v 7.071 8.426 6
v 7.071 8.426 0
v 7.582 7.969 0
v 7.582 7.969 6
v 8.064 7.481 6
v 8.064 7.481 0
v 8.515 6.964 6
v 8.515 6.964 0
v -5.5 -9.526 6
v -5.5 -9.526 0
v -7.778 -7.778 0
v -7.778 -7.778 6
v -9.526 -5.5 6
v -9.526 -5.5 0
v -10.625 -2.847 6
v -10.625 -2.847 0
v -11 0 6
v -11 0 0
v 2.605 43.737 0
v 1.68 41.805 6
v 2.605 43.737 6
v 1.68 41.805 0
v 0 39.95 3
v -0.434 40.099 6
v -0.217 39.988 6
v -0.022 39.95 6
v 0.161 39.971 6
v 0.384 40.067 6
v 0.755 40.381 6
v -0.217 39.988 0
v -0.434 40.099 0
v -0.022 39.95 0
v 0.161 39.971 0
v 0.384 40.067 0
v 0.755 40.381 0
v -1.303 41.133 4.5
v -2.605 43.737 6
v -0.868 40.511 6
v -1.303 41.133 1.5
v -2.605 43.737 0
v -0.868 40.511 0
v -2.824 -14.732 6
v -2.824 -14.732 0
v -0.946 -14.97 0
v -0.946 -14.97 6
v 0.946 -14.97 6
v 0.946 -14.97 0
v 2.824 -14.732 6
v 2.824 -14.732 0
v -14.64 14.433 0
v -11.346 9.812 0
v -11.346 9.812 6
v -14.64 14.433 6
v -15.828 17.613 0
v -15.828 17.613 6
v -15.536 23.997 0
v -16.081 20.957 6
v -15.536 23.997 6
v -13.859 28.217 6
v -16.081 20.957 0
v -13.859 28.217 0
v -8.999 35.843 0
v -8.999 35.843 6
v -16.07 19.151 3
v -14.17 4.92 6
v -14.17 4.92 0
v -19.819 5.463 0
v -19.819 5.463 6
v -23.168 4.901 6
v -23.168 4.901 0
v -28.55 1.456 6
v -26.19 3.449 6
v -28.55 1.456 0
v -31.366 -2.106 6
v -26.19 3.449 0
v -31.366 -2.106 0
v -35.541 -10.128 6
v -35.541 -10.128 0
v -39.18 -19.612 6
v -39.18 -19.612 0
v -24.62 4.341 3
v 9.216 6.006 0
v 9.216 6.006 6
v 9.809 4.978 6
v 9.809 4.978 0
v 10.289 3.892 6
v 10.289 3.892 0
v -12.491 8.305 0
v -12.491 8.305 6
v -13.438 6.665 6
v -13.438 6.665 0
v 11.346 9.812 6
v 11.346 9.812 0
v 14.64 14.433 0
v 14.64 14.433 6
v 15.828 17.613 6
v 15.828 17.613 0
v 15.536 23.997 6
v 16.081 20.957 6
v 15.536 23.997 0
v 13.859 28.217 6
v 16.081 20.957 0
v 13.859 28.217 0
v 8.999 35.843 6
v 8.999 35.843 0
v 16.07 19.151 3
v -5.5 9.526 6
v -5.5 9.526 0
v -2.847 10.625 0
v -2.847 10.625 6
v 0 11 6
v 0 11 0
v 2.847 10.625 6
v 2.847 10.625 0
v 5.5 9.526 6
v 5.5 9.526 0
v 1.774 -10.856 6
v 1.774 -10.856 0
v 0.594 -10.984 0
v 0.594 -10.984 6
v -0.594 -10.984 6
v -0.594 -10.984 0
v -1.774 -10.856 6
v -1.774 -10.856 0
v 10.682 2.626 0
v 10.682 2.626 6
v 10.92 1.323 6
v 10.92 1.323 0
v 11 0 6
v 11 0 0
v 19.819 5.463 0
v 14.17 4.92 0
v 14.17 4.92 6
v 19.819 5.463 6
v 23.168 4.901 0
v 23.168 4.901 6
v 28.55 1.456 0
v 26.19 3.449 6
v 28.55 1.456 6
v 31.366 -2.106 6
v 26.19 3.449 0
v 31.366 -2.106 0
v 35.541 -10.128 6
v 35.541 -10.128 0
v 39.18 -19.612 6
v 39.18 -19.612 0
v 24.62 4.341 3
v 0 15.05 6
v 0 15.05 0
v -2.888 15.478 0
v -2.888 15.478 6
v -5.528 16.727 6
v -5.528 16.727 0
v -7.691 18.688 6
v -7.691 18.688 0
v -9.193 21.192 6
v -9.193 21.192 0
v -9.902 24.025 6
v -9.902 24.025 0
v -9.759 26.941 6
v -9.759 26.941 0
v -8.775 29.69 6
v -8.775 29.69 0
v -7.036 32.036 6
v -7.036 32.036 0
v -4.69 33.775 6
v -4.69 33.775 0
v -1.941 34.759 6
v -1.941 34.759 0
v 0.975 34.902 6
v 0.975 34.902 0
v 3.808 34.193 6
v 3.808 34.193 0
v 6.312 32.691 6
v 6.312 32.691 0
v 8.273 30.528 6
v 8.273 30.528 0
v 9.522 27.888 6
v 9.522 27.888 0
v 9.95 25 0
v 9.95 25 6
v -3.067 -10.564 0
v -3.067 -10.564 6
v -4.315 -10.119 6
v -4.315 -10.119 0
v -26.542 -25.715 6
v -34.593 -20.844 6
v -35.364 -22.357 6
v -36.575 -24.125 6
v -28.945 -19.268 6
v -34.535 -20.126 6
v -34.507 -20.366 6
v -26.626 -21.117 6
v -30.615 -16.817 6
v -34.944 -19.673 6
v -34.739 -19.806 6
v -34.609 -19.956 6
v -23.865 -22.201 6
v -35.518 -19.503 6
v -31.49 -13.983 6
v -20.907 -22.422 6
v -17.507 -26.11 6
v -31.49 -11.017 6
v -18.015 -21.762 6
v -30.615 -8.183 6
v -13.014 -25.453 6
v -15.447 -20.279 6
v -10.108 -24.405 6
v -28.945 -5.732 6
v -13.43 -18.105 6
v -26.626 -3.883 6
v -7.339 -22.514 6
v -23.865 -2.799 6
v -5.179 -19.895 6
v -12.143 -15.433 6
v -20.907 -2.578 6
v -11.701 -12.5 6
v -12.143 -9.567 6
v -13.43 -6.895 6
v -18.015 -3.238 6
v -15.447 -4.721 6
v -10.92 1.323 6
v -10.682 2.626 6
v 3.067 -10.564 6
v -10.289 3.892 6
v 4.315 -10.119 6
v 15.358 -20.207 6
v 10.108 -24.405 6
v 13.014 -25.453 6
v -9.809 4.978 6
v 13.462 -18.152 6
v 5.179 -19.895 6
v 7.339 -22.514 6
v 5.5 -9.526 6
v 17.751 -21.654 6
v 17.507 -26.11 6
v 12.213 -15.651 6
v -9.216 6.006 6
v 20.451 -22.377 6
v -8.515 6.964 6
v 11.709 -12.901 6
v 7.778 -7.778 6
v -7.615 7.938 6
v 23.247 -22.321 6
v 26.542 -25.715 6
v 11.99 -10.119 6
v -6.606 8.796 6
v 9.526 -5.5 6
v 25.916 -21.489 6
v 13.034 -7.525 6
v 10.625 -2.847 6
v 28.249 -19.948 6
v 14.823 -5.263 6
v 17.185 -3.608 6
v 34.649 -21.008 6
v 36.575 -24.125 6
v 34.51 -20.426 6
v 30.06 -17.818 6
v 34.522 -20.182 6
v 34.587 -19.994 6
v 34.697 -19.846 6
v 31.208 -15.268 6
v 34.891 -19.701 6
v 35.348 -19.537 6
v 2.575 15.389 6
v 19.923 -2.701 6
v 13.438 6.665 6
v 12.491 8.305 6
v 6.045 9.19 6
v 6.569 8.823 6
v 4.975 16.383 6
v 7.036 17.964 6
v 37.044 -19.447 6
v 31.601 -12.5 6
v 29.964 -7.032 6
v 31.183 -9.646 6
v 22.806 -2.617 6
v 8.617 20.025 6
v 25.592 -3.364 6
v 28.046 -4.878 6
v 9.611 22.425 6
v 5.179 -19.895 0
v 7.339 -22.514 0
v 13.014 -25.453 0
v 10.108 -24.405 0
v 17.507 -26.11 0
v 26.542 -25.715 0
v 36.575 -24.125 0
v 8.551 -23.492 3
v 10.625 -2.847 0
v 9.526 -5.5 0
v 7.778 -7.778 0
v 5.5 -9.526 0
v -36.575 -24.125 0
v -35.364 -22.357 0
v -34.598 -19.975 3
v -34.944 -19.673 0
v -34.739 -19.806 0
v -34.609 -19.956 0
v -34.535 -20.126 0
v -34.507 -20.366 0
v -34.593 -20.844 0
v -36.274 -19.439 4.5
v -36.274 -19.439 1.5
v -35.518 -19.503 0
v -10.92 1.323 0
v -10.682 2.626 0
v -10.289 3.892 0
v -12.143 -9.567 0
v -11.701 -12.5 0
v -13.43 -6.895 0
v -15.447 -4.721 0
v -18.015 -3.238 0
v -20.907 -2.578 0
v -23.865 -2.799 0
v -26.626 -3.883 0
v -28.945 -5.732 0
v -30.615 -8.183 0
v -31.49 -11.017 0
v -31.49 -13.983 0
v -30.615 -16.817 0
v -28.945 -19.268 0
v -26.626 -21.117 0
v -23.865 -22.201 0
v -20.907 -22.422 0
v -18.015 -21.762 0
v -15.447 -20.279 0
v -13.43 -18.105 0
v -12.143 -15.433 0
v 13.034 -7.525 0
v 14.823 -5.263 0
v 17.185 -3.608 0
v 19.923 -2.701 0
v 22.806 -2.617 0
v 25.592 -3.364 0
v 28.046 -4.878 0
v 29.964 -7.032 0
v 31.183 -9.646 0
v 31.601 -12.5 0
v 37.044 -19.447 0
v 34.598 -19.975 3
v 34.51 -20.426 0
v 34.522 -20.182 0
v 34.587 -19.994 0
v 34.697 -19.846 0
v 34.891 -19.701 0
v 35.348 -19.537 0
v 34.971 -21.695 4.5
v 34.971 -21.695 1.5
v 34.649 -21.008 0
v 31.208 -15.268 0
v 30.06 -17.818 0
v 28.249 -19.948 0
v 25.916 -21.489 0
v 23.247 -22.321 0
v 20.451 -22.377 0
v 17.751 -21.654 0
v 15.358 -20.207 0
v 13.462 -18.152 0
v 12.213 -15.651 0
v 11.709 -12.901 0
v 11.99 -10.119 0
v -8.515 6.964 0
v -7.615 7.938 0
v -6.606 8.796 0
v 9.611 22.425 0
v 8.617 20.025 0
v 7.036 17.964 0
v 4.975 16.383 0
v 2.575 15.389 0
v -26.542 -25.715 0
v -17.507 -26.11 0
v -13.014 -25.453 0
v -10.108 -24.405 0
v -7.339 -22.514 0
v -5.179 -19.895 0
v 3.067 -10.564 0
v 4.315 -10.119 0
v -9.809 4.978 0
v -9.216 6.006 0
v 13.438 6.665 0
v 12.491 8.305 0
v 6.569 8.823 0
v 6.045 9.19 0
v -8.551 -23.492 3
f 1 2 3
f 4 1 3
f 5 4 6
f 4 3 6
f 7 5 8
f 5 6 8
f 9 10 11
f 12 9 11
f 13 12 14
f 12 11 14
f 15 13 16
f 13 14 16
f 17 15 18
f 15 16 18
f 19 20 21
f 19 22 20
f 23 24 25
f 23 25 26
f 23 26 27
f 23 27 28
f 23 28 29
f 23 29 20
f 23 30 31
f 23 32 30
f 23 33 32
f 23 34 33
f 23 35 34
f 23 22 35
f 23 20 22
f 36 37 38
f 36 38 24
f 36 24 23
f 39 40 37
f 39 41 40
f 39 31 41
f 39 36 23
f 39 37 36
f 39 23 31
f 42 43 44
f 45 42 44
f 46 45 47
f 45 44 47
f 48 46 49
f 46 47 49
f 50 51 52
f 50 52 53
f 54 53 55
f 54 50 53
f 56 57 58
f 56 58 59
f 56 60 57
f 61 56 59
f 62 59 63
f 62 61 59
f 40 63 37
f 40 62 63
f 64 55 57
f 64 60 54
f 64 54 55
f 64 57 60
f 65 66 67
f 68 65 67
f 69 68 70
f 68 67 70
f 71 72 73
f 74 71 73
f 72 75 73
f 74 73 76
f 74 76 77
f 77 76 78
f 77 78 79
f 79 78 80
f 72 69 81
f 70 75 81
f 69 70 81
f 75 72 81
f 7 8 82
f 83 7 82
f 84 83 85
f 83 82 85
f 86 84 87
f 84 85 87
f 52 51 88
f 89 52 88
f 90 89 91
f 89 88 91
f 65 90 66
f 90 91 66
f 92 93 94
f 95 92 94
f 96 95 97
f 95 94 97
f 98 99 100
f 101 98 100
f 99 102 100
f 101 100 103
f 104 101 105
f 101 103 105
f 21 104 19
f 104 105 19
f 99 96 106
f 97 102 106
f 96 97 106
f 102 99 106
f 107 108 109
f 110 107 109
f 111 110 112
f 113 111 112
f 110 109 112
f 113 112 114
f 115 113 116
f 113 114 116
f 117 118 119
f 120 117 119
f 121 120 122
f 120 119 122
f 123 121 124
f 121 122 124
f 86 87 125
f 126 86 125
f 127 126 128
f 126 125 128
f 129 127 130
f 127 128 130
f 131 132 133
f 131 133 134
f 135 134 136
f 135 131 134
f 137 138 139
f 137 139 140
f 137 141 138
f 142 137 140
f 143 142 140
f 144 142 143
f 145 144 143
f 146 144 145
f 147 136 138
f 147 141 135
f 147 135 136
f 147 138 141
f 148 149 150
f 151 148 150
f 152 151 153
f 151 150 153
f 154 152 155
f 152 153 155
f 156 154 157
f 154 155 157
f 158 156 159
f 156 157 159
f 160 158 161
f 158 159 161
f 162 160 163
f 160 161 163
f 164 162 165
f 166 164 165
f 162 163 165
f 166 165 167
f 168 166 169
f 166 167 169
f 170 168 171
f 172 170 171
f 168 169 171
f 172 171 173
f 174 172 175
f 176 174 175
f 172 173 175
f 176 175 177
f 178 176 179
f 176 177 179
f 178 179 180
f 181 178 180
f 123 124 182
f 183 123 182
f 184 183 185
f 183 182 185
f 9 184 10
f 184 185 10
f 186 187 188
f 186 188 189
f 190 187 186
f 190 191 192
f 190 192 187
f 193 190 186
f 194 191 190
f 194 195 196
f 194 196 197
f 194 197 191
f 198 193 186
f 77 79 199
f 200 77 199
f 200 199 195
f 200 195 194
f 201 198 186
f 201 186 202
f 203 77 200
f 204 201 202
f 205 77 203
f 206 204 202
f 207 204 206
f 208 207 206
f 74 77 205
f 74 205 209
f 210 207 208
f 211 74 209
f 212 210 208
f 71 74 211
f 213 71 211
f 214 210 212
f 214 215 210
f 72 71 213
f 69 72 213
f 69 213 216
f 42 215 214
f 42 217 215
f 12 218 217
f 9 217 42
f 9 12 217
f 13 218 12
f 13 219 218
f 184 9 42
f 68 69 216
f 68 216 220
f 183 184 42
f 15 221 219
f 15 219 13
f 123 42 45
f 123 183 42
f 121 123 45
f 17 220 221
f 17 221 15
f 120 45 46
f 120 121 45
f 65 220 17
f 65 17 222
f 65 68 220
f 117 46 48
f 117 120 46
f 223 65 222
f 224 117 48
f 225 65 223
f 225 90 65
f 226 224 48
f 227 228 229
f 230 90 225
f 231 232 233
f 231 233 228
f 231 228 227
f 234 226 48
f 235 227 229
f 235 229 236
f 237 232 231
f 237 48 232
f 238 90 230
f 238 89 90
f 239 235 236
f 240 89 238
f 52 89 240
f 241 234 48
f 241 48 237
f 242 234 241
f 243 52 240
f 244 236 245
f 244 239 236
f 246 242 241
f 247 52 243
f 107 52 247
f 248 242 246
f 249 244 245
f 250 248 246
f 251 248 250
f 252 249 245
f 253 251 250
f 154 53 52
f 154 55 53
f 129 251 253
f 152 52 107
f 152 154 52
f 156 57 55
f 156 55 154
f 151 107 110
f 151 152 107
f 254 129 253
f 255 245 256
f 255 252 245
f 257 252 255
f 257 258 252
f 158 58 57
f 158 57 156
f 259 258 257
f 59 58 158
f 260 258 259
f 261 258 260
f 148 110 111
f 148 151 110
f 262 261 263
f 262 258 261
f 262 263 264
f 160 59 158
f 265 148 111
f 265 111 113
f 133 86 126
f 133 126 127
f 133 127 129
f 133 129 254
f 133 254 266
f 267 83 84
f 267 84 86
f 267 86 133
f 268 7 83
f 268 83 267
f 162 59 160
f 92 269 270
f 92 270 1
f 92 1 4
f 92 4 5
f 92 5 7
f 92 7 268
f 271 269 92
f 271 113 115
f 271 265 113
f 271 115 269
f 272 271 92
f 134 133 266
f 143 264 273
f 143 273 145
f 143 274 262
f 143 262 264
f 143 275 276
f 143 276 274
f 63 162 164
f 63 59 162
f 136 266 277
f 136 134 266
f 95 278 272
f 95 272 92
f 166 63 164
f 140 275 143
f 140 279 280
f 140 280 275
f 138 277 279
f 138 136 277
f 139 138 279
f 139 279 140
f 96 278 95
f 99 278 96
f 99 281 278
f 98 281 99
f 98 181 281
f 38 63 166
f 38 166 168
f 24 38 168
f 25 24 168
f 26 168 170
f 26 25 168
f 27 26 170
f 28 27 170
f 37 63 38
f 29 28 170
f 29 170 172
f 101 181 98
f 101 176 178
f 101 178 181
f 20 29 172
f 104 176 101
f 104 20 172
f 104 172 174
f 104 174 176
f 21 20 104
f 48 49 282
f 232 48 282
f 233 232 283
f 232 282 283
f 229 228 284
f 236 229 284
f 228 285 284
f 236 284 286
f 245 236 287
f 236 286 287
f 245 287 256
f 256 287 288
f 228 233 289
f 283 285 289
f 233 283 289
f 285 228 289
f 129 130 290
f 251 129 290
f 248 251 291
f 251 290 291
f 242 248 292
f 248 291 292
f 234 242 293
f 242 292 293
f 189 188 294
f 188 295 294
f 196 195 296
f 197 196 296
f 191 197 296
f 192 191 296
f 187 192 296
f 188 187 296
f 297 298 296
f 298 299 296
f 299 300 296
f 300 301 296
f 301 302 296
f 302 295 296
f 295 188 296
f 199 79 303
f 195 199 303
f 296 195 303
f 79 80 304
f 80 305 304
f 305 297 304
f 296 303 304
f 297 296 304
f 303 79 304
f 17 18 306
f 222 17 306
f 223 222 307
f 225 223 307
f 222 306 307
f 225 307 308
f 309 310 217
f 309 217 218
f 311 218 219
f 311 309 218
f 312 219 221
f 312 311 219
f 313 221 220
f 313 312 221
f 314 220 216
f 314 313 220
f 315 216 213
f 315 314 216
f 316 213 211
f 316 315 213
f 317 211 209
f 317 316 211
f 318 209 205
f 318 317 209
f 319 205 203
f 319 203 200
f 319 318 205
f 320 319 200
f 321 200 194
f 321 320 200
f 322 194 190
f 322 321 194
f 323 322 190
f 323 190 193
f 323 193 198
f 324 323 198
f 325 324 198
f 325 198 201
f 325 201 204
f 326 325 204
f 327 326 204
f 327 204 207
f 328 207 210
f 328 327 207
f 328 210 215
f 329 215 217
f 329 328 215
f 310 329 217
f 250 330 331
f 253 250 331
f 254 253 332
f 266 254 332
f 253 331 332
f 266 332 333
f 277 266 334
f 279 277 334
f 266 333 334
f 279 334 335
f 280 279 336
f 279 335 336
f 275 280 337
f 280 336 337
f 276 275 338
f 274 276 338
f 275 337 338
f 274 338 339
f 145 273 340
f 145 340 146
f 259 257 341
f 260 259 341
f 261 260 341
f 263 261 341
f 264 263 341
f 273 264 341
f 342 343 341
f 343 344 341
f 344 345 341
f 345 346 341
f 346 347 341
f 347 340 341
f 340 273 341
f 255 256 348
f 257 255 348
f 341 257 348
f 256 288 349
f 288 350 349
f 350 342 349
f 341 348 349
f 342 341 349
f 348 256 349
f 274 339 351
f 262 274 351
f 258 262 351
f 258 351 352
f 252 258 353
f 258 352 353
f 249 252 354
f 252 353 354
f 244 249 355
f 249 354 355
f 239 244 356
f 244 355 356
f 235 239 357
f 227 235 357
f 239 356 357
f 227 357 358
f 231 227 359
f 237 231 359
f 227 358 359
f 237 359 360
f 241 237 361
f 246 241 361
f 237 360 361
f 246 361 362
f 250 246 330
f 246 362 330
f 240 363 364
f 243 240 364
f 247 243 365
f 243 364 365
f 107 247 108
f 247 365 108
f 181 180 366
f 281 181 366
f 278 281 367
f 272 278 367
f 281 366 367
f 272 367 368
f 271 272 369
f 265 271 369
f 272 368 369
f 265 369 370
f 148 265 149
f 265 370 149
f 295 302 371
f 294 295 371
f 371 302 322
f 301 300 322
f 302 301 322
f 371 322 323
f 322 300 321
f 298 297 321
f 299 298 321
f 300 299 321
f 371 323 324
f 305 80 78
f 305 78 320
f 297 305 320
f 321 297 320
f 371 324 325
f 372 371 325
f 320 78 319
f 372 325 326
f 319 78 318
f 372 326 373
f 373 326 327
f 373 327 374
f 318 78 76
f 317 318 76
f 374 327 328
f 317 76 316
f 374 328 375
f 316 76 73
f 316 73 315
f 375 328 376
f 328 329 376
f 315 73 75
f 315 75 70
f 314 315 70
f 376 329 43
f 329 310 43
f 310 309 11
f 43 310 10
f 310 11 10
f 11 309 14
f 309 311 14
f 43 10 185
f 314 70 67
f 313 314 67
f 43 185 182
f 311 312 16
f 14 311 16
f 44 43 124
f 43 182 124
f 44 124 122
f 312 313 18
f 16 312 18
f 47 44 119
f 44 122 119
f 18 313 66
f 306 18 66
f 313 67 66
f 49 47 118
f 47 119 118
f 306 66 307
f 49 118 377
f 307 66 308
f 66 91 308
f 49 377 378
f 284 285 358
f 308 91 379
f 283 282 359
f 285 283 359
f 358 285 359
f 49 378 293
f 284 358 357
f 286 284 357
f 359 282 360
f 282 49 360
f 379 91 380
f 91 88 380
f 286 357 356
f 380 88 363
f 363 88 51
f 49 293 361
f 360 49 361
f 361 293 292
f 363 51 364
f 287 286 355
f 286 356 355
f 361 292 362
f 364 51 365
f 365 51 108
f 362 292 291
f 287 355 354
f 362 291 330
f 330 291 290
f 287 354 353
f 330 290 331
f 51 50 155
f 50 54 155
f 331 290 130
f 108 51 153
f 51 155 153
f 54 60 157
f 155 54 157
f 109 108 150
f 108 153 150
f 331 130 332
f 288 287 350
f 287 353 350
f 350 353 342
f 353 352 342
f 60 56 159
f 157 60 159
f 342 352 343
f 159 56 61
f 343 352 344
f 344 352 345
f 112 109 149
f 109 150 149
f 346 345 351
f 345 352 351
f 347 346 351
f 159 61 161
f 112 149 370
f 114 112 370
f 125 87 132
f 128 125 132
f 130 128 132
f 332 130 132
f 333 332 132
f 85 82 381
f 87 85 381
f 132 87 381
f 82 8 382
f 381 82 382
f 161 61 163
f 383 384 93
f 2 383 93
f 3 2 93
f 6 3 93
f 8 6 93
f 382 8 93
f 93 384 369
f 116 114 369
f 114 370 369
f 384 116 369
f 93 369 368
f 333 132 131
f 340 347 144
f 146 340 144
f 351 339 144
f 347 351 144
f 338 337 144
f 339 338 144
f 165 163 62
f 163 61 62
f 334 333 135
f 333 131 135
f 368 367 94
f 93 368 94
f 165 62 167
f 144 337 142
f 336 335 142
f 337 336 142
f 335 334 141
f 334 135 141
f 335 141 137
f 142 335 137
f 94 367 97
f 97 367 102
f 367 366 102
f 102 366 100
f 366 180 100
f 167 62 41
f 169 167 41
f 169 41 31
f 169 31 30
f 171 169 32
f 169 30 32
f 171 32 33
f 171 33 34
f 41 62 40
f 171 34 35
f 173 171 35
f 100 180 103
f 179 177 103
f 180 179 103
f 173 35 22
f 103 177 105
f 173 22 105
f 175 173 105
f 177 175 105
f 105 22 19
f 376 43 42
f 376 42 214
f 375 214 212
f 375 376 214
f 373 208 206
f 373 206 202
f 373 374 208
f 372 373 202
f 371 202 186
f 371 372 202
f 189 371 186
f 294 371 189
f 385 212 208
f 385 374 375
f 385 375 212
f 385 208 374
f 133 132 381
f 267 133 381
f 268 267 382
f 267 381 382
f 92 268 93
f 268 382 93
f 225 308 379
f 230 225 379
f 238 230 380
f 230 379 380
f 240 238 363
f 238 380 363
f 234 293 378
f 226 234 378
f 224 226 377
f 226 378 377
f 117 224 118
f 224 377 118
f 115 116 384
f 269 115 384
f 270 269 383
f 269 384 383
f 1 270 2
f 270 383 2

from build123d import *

# Parameters (mm, degrees)
F0_R     = 9.95
F1_DEPTH = 6


with BuildPart() as f1:
    # F0 (on Top) → F1 (new body)
    with BuildSketch(Plane.XY):
        with BuildLine():
            ThreePointArc((5.5, 9.5262794416), (6.3093407999, 9.0106724872), (7.0706637066, 8.4264888743))
            ThreePointArc((7.0706637066, 8.4264888743), (7.8268557987, 7.7291867817), (8.5146077493, 6.9642985918))
            add(Edge.make_bspline(
                [(8.5146077493, 6.9642985918), (9.5301249028, 7.9008868503), (10.4822945034, 8.8485192108), (11.3460669028, 9.8115628642)],
                knots=[0.1806363612, 0.1806363612, 0.1806363612, 0.1806363612, 0.2520657546, 0.2520657546, 0.2520657546, 0.2520657546], degree=3))
            add(Edge.make_bspline(
                [(11.3460669028, 9.8115628642), (13.9736725709, 12.7411528396), (19.7429640918, 22.5358646022), (10.0301146668, 35.0297546933), (2.6054169788, 43.7370347171)],
                knots=[0.2520657546, 0.2520657546, 0.2520657546, 0.2520657546, 0.4693547987, 0.9448204936, 0.9448204936, 0.9448204936, 0.9448204936], degree=3))
            add(Edge.make_bspline(
                [(-2.6054169788, 43.7370347171), (-1.7369446525, 41.8435173586), (0, 38.0564826414), (1.7369446525, 41.8435173586), (2.6054169788, 43.7370347171)],
                knots=[0, 0, 0, 0, 0.5, 1, 1, 1, 1], degree=3))
            add(Edge.make_bspline(
                [(-11.3460669028, 9.8115628642), (-13.9736725709, 12.7411528396), (-19.7429640918, 22.5358646022), (-10.0301146668, 35.0297546933), (-2.6054169788, 43.7370347171)],
                knots=[0.2520657546, 0.2520657546, 0.2520657546, 0.2520657546, 0.4693547987, 0.9448204936, 0.9448204936, 0.9448204936, 0.9448204936], degree=3))
            add(Edge.make_bspline(
                [(-8.5146077493, 6.9642985918), (-9.5301249028, 7.9008868503), (-10.4822945034, 8.8485192108), (-11.3460669028, 9.8115628642)],
                knots=[0.1806363612, 0.1806363612, 0.1806363612, 0.1806363612, 0.2520657546, 0.2520657546, 0.2520657546, 0.2520657546], degree=3))
            ThreePointArc((-8.5146077493, 6.9642985918), (-7.1234292346, 8.381930323), (-5.5, 9.5262794416))
            ThreePointArc((-5.5, 9.5262794416), (0, 11), (5.5, 9.5262794416))
        make_face()
        with BuildLine():
            ThreePointArc((0, 15.05), (-7.0357124728, 32.0357124728), (9.95, 25))
            ThreePointArc((9.95, 25), (7.0357124728, 17.9642875272), (0, 15.05))
        make_face(mode=Mode.SUBTRACT)
        with BuildLine():
            add(Edge.make_bspline(
                [(8.5146077493, 6.9642985918), (9.5301249028, 7.9008868503), (10.4822945034, 8.8485192108), (11.3460669028, 9.8115628642)],
                knots=[0.1806363612, 0.1806363612, 0.1806363612, 0.1806363612, 0.2520657546, 0.2520657546, 0.2520657546, 0.2520657546], degree=3))
            ThreePointArc((8.5146077493, 6.9642985918), (9.5262794416, 5.5), (10.2885633747, 3.8917173182))
            add(Edge.make_bspline(
                [(10.2885633747, 3.8917173182), (11.6074311762, 4.3028868419), (12.9041896741, 4.6536737245), (14.1700961426, 4.9202007387)],
                knots=[0.1806363612, 0.1806363612, 0.1806363612, 0.1806363612, 0.2520657546, 0.2520657546, 0.2520657546, 0.2520657546], degree=3))
            ThreePointArc((14.1700961426, 4.9202007387), (12.9903810568, 7.5), (11.3460669028, 9.8115628642))
        make_face()
        with BuildLine():
            add(Edge.make_bspline(
                [(10.2885633747, 3.8917173182), (11.6074311762, 4.3028868419), (12.9041896741, 4.6536737245), (14.1700961426, 4.9202007387)],
                knots=[0.1806363612, 0.1806363612, 0.1806363612, 0.1806363612, 0.2520657546, 0.2520657546, 0.2520657546, 0.2520657546], degree=3))
            ThreePointArc((10.2885633747, 3.8917173182), (10.8206792098, 1.9781055177), (11, 0))
            ThreePointArc((11, 0), (9.5262794416, -5.5), (5.5, -9.5262794416))
            ThreePointArc((5.5, -9.5262794416), (3.6972499752, -10.3600358407), (1.7739556254, -10.85601591))
            add(Edge.make_bspline(
                [(1.7739556254, -10.85601591), (2.0773062734, -12.2037736923), (2.4218951707, -13.5021929353), (2.8240292398, -14.7317636029)],
                knots=[0.1806363612, 0.1806363612, 0.1806363612, 0.1806363612, 0.2520657546, 0.2520657546, 0.2520657546, 0.2520657546], degree=3))
            add(Edge.make_bspline(
                [(2.8240292398, -14.7317636029), (4.0473257472, -18.4721318504), (9.6451491958, -28.3658407506), (25.3216001194, -26.201211451), (36.5746746618, -24.1248746496)],
                knots=[0.2520657546, 0.2520657546, 0.2520657546, 0.2520657546, 0.4693547987, 0.9448204936, 0.9448204936, 0.9448204936, 0.9448204936], degree=3))
            add(Edge.make_bspline(
                [(36.5746746618, -24.1248746496), (35.3690766899, -22.4259968733), (32.9578807462, -19.0282413207), (37.1060213425, -19.4175204852), (39.1800916406, -19.6121600675)],
                knots=[0, 0, 0, 0, 0.5, 1, 1, 1, 1], degree=3))
            add(Edge.make_bspline(
                [(14.1700961426, 4.9202007387), (18.0209983181, 5.7309790107), (29.3881132876, 5.8299761484), (35.3517147861, -8.8285432423), (39.1800916406, -19.6121600675)],
                knots=[0.2520657546, 0.2520657546, 0.2520657546, 0.2520657546, 0.4693547987, 0.9448204936, 0.9448204936, 0.9448204936, 0.9448204936], degree=3))
        make_face()
        with BuildLine():
            ThreePointArc((13.033682327, -7.525), (24.2258845934, -2.8890380284), (31.6006350946, -12.5))
            ThreePointArc((31.6006350946, -12.5), (19.0753855958, -22.1109619716), (13.033682327, -7.525))
        make_face(mode=Mode.SUBTRACT)
        with BuildLine():
            ThreePointArc((-10.2885633747, 3.8917173182), (-9.5262794416, 5.5), (-8.5146077493, 6.9642985918))
            add(Edge.make_bspline(
                [(-8.5146077493, 6.9642985918), (-9.5301249028, 7.9008868503), (-10.4822945034, 8.8485192108), (-11.3460669028, 9.8115628642)],
                knots=[0.1806363612, 0.1806363612, 0.1806363612, 0.1806363612, 0.2520657546, 0.2520657546, 0.2520657546, 0.2520657546], degree=3))
            ThreePointArc((-11.3460669028, 9.8115628642), (-12.9903810568, 7.5), (-14.1700961426, 4.9202007387))
            add(Edge.make_bspline(
                [(-10.2885633747, 3.8917173182), (-11.6074311762, 4.3028868419), (-12.9041896741, 4.6536737245), (-14.1700961426, 4.9202007387)],
                knots=[0.1806363612, 0.1806363612, 0.1806363612, 0.1806363612, 0.2520657546, 0.2520657546, 0.2520657546, 0.2520657546], degree=3))
        make_face()
        with BuildLine():
            add(Edge.make_bspline(
                [(1.7739556254, -10.85601591), (2.0773062734, -12.2037736923), (2.4218951707, -13.5021929353), (2.8240292398, -14.7317636029)],
                knots=[0.1806363612, 0.1806363612, 0.1806363612, 0.1806363612, 0.2520657546, 0.2520657546, 0.2520657546, 0.2520657546], degree=3))
            ThreePointArc((1.7739556254, -10.85601591), (0, -11), (-1.7739556254, -10.85601591))
            add(Edge.make_bspline(
                [(-1.7739556254, -10.85601591), (-2.0773062734, -12.2037736923), (-2.4218951707, -13.5021929353), (-2.8240292398, -14.7317636029)],
                knots=[0.1806363612, 0.1806363612, 0.1806363612, 0.1806363612, 0.2520657546, 0.2520657546, 0.2520657546, 0.2520657546], degree=3))
            ThreePointArc((-2.8240292398, -14.7317636029), (0, -15), (2.8240292398, -14.7317636029))
        make_face()
        with BuildLine():
            ThreePointArc((-11, 0), (-10.8206792098, 1.9781055177), (-10.2885633747, 3.8917173182))
            add(Edge.make_bspline(
                [(-10.2885633747, 3.8917173182), (-11.6074311762, 4.3028868419), (-12.9041896741, 4.6536737245), (-14.1700961426, 4.9202007387)],
                knots=[0.1806363612, 0.1806363612, 0.1806363612, 0.1806363612, 0.2520657546, 0.2520657546, 0.2520657546, 0.2520657546], degree=3))
            add(Edge.make_bspline(
                [(-14.1700961426, 4.9202007387), (-18.0209983181, 5.7309790107), (-29.3881132876, 5.8299761484), (-35.3517147861, -8.8285432423), (-39.1800916406, -19.6121600675)],
                knots=[0.2520657546, 0.2520657546, 0.2520657546, 0.2520657546, 0.4693547987, 0.9448204936, 0.9448204936, 0.9448204936, 0.9448204936], degree=3))
            add(Edge.make_bspline(
                [(-39.1800916406, -19.6121600675), (-37.1060213425, -19.4175204852), (-32.9578807462, -19.0282413207), (-35.3690766899, -22.4259968733), (-36.5746746618, -24.1248746496)],
                knots=[0, 0, 0, 0, 0.5, 1, 1, 1, 1], degree=3))
            add(Edge.make_bspline(
                [(-2.8240292398, -14.7317636029), (-4.0473257472, -18.4721318504), (-9.6451491958, -28.3658407506), (-25.3216001194, -26.201211451), (-36.5746746618, -24.1248746496)],
                knots=[0.2520657546, 0.2520657546, 0.2520657546, 0.2520657546, 0.4693547987, 0.9448204936, 0.9448204936, 0.9448204936, 0.9448204936], degree=3))
            add(Edge.make_bspline(
                [(-1.7739556254, -10.85601591), (-2.0773062734, -12.2037736923), (-2.4218951707, -13.5021929353), (-2.8240292398, -14.7317636029)],
                knots=[0.1806363612, 0.1806363612, 0.1806363612, 0.1806363612, 0.2520657546, 0.2520657546, 0.2520657546, 0.2520657546], degree=3))
            ThreePointArc((-1.7739556254, -10.85601591), (-3.6972499752, -10.3600358407), (-5.5, -9.5262794416))
            ThreePointArc((-5.5, -9.5262794416), (-9.5262794416, -5.5), (-11, 0))
        make_face()
        with Locations((-21.6506350946, -12.5)):
            Circle(F0_R, mode=Mode.SUBTRACT)
    extrude(amount=F1_DEPTH)


solid = f1.part
